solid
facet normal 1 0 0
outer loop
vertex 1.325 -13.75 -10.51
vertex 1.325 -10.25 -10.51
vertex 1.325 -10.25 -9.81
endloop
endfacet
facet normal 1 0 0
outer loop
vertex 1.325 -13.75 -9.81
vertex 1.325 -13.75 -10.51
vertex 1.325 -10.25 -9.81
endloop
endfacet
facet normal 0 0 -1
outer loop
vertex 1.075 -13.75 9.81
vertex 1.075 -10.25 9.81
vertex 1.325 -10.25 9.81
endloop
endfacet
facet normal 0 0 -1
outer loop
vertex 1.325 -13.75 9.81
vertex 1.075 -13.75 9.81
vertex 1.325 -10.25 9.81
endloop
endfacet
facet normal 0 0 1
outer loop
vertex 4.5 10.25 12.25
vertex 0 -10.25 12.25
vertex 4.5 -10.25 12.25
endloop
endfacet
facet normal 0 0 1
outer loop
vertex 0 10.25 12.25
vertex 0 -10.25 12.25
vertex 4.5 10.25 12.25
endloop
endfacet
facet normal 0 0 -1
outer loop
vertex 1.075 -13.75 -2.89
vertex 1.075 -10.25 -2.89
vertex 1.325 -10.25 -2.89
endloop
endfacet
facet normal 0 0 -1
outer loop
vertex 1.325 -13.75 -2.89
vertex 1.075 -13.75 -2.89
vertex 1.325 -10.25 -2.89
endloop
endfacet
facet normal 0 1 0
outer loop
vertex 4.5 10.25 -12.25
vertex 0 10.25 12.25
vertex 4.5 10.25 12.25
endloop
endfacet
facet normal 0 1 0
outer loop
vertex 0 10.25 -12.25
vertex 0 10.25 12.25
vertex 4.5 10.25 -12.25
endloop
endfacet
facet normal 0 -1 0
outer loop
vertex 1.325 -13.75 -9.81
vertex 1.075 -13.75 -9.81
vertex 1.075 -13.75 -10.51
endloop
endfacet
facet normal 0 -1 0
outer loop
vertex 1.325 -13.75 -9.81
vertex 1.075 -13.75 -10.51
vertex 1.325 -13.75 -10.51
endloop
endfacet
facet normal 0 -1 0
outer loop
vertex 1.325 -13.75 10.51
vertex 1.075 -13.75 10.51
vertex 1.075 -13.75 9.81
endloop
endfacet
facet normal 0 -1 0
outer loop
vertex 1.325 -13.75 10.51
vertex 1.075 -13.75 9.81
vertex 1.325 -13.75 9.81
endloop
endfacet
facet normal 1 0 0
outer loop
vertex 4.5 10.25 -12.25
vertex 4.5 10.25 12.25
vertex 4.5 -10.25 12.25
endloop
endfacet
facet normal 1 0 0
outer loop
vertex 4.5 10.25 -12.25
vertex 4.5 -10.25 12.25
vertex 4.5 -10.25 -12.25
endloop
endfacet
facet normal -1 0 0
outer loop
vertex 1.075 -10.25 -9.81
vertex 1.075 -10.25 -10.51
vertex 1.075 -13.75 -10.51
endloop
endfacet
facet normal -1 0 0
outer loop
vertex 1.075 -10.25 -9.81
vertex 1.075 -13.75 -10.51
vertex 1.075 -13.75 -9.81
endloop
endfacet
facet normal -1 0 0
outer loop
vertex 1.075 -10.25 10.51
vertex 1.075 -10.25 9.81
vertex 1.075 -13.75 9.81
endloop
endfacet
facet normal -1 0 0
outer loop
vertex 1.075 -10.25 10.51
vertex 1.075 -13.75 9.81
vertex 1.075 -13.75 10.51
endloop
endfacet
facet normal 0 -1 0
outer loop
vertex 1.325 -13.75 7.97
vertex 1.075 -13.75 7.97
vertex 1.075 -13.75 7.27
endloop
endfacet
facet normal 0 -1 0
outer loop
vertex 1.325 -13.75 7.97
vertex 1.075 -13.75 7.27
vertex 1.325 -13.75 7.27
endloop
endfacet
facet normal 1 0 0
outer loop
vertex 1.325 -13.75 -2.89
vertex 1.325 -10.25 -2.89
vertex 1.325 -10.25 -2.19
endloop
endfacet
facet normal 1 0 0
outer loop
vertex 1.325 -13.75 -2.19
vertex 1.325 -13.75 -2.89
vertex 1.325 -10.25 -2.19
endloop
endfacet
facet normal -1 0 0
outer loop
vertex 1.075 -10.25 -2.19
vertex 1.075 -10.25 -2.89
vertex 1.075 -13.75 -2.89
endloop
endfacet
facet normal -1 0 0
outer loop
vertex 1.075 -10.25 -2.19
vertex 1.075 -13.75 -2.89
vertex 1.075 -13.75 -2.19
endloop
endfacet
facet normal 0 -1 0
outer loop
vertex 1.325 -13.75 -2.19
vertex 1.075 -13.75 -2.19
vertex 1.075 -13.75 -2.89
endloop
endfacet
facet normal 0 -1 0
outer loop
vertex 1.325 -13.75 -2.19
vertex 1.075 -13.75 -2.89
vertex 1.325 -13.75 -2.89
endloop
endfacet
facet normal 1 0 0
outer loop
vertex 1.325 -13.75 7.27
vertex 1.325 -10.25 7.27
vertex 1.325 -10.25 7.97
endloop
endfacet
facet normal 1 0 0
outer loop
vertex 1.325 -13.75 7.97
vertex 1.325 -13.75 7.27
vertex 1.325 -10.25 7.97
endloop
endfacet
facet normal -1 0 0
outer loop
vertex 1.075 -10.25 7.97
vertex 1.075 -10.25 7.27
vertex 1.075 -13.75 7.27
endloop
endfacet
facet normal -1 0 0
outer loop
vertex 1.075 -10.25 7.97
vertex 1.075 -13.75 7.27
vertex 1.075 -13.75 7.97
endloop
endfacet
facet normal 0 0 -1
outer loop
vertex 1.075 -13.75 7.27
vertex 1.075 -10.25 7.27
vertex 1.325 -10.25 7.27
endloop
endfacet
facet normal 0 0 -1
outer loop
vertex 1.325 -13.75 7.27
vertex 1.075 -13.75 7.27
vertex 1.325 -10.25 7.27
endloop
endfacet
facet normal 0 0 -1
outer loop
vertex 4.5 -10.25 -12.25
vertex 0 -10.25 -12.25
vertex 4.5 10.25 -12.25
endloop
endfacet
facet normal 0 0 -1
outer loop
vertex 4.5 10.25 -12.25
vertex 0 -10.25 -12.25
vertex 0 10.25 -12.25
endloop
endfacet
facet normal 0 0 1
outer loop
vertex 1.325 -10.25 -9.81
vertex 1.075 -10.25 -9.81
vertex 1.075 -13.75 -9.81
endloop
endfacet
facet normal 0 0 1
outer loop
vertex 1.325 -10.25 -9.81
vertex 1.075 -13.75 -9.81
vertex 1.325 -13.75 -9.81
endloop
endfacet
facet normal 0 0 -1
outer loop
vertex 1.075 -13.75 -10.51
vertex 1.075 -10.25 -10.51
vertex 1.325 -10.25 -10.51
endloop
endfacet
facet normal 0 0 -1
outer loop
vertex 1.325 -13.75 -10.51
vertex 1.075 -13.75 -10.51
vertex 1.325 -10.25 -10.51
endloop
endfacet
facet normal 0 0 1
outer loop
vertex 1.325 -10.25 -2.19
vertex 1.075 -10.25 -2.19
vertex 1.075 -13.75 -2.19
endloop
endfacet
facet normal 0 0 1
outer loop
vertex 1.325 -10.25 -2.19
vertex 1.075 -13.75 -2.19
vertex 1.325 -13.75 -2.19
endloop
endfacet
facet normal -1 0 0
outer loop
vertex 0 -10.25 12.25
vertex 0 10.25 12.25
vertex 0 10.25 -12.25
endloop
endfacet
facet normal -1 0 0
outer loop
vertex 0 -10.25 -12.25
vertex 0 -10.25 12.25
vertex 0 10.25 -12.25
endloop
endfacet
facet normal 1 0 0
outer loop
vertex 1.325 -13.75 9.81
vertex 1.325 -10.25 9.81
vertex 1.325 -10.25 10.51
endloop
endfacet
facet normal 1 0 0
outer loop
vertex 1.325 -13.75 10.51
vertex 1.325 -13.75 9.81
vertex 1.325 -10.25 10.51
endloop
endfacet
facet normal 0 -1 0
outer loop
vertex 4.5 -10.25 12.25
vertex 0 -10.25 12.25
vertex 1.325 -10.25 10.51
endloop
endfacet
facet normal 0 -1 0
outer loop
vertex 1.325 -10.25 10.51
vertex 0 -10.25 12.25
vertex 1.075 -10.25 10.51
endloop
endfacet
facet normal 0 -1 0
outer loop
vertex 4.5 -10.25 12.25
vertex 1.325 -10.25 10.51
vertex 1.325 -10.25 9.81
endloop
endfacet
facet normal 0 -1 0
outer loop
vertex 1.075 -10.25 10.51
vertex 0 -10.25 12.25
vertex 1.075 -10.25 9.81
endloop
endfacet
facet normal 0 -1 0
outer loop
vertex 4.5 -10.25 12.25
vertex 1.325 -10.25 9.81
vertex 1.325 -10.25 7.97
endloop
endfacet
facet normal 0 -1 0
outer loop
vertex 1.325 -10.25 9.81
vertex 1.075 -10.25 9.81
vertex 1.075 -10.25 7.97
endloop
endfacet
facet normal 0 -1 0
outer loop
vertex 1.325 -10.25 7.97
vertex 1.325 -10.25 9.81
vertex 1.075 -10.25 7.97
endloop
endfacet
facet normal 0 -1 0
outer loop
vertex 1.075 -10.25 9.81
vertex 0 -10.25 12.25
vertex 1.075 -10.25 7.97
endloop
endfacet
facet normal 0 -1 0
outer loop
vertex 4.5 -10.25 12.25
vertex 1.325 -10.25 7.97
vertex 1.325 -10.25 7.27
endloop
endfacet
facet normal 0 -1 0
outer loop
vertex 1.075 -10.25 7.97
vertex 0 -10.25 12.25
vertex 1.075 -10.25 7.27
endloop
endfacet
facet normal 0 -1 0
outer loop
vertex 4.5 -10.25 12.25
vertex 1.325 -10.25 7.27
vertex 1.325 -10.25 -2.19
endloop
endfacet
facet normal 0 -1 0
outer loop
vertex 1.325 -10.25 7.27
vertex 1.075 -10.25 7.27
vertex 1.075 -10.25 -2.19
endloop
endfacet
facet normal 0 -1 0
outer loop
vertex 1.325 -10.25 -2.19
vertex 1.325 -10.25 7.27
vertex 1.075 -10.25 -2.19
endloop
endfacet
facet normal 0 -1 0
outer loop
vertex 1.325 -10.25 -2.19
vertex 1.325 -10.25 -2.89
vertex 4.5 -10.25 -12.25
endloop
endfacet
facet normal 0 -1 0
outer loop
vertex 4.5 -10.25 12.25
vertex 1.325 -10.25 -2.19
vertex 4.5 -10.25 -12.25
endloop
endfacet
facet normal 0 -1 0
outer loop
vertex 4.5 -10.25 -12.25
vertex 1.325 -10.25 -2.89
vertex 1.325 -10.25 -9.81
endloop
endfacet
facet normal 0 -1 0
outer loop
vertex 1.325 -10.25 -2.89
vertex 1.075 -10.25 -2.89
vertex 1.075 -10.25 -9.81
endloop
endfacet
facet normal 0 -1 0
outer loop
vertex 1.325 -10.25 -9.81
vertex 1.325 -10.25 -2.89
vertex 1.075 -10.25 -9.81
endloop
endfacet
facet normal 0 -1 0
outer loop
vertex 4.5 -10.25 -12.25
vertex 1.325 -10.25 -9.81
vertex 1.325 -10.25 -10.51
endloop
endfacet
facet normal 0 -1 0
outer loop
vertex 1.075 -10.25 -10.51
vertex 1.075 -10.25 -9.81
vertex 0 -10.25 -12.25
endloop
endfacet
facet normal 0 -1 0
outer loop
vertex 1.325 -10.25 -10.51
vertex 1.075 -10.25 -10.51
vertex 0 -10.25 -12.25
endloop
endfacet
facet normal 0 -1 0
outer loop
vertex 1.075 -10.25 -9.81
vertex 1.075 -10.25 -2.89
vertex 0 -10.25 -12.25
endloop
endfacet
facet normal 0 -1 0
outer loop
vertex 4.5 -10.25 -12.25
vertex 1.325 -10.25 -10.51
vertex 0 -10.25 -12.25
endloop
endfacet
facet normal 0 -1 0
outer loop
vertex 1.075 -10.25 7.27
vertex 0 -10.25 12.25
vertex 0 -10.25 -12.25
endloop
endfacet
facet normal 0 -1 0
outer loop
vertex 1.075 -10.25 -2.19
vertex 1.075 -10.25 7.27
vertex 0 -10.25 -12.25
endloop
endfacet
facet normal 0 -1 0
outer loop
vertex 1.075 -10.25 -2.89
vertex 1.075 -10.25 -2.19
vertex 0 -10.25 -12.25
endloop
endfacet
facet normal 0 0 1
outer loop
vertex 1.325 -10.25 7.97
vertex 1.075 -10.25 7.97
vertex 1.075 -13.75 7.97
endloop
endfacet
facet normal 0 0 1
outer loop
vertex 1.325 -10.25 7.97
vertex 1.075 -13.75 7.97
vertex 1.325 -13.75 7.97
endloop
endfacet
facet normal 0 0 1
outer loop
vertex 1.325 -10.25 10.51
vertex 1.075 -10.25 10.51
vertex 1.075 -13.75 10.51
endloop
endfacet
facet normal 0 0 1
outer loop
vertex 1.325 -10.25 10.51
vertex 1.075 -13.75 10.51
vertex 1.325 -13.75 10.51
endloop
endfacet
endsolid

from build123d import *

# Parameters (mm, degrees)
SKETCH1_W           = 24.5
SKETCH1_H           = 20.5
BOSS_EXTRUDE1_DEPTH = 4.5
SKETCH2_W           = 0.25
SKETCH2_H           = 0.7
BOSS_EXTRUDE2_DEPTH = 3.5


with BuildPart() as part:
    # Sketch1 → Boss-Extrude1 (new body)
    with BuildSketch(Plane(origin=(0, 0, 0), x_dir=(0, 0, -1), z_dir=(1, 0, 0))):
        Rectangle(SKETCH1_W, SKETCH1_H)
    extrude(amount=BOSS_EXTRUDE1_DEPTH)

    # Sketch2 → Boss-Extrude2 (add)
    with BuildSketch(Plane.XZ.offset(10.25)):
        with Locations((1.2, 7.62)):
            Rectangle(SKETCH2_W, SKETCH2_H)
        with Locations((1.2, 10.16)):
            Rectangle(SKETCH2_W, SKETCH2_H)
        with Locations((1.2, -2.54)):
            Rectangle(SKETCH2_W, SKETCH2_H)
        with Locations((1.2, -10.16)):
            Rectangle(SKETCH2_W, SKETCH2_H)
    extrude(amount=BOSS_EXTRUDE2_DEPTH)


solid = part.part
